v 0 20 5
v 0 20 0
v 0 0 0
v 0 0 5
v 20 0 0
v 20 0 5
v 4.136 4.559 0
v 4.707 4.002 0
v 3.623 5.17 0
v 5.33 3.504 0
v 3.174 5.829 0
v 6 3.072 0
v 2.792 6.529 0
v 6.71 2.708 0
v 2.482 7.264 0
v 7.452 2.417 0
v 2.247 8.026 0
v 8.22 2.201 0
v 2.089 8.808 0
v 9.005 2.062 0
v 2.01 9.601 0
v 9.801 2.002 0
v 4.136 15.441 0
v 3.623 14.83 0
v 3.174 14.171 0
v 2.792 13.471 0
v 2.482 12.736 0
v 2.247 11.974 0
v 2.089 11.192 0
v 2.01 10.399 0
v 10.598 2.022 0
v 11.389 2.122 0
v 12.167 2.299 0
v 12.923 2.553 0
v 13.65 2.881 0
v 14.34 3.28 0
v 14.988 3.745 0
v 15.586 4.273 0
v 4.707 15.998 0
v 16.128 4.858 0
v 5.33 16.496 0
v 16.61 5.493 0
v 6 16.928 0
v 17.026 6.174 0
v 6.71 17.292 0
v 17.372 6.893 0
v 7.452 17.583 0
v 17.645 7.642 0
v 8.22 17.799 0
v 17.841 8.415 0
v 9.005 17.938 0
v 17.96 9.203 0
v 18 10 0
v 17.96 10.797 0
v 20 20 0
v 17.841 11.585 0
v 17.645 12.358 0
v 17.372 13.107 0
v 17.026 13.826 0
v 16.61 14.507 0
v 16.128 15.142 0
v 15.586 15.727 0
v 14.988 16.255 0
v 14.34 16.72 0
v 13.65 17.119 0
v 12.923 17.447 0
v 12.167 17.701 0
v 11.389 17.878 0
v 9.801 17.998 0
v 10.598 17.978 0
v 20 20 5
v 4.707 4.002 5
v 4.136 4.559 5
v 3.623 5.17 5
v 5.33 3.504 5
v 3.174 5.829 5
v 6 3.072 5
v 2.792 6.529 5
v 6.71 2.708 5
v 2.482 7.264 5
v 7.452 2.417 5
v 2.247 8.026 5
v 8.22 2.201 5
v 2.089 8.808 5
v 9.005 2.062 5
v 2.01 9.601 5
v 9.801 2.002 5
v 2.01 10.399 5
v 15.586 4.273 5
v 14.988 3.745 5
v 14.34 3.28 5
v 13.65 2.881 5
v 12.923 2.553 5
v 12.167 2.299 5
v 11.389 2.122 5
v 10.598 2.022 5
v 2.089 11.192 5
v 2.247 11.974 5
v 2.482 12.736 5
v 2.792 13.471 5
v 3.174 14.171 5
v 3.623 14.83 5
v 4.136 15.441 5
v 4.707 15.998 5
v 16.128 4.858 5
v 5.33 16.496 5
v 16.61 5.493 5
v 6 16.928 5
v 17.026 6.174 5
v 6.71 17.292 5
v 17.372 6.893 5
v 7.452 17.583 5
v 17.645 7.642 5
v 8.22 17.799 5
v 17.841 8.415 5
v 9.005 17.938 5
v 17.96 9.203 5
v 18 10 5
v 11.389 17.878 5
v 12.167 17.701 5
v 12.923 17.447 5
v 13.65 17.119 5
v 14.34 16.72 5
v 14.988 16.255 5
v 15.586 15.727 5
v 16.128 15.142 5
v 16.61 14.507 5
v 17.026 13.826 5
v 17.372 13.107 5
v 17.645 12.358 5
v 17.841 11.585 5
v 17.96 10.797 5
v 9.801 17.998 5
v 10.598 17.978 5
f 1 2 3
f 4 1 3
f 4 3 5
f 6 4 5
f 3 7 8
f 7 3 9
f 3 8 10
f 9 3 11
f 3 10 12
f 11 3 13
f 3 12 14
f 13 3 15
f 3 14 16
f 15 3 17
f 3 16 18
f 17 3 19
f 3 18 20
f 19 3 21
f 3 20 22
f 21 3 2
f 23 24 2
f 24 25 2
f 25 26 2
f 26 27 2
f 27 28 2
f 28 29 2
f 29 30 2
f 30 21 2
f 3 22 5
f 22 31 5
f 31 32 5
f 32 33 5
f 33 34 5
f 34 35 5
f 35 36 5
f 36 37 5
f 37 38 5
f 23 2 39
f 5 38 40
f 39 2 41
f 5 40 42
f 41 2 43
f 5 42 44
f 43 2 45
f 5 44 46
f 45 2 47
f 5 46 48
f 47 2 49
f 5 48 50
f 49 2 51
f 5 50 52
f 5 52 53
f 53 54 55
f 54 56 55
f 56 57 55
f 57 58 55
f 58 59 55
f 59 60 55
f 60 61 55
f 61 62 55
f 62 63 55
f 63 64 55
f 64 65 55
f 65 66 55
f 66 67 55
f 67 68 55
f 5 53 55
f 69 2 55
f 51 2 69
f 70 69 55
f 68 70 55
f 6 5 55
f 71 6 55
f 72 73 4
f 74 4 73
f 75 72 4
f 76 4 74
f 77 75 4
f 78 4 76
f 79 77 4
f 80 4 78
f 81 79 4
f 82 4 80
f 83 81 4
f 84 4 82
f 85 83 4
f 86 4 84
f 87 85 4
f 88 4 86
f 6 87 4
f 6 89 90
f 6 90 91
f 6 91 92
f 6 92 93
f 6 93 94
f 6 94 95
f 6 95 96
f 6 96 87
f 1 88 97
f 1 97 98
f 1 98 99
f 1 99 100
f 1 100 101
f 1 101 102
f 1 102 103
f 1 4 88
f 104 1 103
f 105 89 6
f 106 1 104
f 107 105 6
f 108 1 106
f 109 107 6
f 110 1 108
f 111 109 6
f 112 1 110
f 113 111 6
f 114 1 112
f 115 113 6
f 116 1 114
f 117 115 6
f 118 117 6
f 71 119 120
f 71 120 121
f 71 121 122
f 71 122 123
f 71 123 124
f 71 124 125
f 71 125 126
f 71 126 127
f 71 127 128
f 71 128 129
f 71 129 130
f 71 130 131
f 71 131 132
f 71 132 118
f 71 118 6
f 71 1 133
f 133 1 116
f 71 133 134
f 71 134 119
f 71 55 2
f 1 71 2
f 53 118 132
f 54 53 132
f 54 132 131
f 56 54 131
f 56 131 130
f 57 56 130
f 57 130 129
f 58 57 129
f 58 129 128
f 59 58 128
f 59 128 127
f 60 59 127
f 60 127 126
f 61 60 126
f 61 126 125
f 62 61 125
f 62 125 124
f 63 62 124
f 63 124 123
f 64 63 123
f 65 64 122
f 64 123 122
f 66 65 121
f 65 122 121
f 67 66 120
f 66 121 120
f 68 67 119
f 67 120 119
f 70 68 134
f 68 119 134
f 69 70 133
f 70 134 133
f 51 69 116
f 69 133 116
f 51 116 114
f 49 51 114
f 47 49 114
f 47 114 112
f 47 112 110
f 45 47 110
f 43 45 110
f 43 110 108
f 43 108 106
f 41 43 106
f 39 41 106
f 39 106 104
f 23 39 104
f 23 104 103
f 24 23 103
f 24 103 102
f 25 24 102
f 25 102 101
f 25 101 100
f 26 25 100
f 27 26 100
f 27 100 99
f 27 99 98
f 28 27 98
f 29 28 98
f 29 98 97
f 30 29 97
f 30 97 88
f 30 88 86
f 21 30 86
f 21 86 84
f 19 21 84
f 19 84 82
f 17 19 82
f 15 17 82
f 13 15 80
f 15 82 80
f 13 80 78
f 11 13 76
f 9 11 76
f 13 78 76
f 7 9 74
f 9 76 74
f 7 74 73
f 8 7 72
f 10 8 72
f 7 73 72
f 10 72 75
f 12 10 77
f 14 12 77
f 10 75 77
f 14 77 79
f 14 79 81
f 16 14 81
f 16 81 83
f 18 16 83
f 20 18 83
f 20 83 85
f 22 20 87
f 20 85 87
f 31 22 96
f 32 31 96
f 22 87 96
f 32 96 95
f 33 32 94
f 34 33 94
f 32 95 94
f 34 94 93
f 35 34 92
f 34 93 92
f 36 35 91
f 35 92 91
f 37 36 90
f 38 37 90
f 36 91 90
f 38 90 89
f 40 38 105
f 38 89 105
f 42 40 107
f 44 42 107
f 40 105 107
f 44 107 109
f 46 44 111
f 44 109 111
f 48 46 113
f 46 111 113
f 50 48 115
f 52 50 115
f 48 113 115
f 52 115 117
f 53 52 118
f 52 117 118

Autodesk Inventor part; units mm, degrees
ref_plane "YZ Plane" through (0, 0, 0) normal (1, 0, 0) x (0, 1, 0)
ref_plane "XZ Plane" through (0, 0, 0) normal (0, 1, 0) x (-1, 0, 0)
ref_plane "XY Plane" through (0, 0, 0) normal (0, 0, 1) x (1, 0, 0)
sketch "Sketch1" plane through (0, 0, 0) normal (0, 0, 1) x (1, 0, 0)
  line L0 (0, 0) -> (20, 0)
  line L1 (20, 0) -> (20, 20)
  line L2 (20, 20) -> (0, 20)
  line L3 (0, 20) -> (0, 0)
  dimension "d0" = 20
  dimension "d1" = 20
extrude "Extrusion1" add sketch "Sketch1" along normal blind 5
sketch "Sketch2" plane through (0, 0, 5) normal (0, 0, 1) x (1, 0, 0)
  line L0 (0, 0) -> (10, 0)
  line L1 (0, 0) -> (20, 0) projected
  line L2 (10, 0) -> (10, 10)
  circle A0 centre (10, 10) radius 8
  dimension "d4" = 10
  dimension "d5" = 10
  dimension "d6" = 16
extrude "Extrusion2" cut sketch "Sketch2" against normal through all
thread "Thread1" size "M16x2" class "6H" standard "ANSI Metric M Profile" full length
properties part number "DC MOTOR NUT FOR CAPPING SYSTEM"
